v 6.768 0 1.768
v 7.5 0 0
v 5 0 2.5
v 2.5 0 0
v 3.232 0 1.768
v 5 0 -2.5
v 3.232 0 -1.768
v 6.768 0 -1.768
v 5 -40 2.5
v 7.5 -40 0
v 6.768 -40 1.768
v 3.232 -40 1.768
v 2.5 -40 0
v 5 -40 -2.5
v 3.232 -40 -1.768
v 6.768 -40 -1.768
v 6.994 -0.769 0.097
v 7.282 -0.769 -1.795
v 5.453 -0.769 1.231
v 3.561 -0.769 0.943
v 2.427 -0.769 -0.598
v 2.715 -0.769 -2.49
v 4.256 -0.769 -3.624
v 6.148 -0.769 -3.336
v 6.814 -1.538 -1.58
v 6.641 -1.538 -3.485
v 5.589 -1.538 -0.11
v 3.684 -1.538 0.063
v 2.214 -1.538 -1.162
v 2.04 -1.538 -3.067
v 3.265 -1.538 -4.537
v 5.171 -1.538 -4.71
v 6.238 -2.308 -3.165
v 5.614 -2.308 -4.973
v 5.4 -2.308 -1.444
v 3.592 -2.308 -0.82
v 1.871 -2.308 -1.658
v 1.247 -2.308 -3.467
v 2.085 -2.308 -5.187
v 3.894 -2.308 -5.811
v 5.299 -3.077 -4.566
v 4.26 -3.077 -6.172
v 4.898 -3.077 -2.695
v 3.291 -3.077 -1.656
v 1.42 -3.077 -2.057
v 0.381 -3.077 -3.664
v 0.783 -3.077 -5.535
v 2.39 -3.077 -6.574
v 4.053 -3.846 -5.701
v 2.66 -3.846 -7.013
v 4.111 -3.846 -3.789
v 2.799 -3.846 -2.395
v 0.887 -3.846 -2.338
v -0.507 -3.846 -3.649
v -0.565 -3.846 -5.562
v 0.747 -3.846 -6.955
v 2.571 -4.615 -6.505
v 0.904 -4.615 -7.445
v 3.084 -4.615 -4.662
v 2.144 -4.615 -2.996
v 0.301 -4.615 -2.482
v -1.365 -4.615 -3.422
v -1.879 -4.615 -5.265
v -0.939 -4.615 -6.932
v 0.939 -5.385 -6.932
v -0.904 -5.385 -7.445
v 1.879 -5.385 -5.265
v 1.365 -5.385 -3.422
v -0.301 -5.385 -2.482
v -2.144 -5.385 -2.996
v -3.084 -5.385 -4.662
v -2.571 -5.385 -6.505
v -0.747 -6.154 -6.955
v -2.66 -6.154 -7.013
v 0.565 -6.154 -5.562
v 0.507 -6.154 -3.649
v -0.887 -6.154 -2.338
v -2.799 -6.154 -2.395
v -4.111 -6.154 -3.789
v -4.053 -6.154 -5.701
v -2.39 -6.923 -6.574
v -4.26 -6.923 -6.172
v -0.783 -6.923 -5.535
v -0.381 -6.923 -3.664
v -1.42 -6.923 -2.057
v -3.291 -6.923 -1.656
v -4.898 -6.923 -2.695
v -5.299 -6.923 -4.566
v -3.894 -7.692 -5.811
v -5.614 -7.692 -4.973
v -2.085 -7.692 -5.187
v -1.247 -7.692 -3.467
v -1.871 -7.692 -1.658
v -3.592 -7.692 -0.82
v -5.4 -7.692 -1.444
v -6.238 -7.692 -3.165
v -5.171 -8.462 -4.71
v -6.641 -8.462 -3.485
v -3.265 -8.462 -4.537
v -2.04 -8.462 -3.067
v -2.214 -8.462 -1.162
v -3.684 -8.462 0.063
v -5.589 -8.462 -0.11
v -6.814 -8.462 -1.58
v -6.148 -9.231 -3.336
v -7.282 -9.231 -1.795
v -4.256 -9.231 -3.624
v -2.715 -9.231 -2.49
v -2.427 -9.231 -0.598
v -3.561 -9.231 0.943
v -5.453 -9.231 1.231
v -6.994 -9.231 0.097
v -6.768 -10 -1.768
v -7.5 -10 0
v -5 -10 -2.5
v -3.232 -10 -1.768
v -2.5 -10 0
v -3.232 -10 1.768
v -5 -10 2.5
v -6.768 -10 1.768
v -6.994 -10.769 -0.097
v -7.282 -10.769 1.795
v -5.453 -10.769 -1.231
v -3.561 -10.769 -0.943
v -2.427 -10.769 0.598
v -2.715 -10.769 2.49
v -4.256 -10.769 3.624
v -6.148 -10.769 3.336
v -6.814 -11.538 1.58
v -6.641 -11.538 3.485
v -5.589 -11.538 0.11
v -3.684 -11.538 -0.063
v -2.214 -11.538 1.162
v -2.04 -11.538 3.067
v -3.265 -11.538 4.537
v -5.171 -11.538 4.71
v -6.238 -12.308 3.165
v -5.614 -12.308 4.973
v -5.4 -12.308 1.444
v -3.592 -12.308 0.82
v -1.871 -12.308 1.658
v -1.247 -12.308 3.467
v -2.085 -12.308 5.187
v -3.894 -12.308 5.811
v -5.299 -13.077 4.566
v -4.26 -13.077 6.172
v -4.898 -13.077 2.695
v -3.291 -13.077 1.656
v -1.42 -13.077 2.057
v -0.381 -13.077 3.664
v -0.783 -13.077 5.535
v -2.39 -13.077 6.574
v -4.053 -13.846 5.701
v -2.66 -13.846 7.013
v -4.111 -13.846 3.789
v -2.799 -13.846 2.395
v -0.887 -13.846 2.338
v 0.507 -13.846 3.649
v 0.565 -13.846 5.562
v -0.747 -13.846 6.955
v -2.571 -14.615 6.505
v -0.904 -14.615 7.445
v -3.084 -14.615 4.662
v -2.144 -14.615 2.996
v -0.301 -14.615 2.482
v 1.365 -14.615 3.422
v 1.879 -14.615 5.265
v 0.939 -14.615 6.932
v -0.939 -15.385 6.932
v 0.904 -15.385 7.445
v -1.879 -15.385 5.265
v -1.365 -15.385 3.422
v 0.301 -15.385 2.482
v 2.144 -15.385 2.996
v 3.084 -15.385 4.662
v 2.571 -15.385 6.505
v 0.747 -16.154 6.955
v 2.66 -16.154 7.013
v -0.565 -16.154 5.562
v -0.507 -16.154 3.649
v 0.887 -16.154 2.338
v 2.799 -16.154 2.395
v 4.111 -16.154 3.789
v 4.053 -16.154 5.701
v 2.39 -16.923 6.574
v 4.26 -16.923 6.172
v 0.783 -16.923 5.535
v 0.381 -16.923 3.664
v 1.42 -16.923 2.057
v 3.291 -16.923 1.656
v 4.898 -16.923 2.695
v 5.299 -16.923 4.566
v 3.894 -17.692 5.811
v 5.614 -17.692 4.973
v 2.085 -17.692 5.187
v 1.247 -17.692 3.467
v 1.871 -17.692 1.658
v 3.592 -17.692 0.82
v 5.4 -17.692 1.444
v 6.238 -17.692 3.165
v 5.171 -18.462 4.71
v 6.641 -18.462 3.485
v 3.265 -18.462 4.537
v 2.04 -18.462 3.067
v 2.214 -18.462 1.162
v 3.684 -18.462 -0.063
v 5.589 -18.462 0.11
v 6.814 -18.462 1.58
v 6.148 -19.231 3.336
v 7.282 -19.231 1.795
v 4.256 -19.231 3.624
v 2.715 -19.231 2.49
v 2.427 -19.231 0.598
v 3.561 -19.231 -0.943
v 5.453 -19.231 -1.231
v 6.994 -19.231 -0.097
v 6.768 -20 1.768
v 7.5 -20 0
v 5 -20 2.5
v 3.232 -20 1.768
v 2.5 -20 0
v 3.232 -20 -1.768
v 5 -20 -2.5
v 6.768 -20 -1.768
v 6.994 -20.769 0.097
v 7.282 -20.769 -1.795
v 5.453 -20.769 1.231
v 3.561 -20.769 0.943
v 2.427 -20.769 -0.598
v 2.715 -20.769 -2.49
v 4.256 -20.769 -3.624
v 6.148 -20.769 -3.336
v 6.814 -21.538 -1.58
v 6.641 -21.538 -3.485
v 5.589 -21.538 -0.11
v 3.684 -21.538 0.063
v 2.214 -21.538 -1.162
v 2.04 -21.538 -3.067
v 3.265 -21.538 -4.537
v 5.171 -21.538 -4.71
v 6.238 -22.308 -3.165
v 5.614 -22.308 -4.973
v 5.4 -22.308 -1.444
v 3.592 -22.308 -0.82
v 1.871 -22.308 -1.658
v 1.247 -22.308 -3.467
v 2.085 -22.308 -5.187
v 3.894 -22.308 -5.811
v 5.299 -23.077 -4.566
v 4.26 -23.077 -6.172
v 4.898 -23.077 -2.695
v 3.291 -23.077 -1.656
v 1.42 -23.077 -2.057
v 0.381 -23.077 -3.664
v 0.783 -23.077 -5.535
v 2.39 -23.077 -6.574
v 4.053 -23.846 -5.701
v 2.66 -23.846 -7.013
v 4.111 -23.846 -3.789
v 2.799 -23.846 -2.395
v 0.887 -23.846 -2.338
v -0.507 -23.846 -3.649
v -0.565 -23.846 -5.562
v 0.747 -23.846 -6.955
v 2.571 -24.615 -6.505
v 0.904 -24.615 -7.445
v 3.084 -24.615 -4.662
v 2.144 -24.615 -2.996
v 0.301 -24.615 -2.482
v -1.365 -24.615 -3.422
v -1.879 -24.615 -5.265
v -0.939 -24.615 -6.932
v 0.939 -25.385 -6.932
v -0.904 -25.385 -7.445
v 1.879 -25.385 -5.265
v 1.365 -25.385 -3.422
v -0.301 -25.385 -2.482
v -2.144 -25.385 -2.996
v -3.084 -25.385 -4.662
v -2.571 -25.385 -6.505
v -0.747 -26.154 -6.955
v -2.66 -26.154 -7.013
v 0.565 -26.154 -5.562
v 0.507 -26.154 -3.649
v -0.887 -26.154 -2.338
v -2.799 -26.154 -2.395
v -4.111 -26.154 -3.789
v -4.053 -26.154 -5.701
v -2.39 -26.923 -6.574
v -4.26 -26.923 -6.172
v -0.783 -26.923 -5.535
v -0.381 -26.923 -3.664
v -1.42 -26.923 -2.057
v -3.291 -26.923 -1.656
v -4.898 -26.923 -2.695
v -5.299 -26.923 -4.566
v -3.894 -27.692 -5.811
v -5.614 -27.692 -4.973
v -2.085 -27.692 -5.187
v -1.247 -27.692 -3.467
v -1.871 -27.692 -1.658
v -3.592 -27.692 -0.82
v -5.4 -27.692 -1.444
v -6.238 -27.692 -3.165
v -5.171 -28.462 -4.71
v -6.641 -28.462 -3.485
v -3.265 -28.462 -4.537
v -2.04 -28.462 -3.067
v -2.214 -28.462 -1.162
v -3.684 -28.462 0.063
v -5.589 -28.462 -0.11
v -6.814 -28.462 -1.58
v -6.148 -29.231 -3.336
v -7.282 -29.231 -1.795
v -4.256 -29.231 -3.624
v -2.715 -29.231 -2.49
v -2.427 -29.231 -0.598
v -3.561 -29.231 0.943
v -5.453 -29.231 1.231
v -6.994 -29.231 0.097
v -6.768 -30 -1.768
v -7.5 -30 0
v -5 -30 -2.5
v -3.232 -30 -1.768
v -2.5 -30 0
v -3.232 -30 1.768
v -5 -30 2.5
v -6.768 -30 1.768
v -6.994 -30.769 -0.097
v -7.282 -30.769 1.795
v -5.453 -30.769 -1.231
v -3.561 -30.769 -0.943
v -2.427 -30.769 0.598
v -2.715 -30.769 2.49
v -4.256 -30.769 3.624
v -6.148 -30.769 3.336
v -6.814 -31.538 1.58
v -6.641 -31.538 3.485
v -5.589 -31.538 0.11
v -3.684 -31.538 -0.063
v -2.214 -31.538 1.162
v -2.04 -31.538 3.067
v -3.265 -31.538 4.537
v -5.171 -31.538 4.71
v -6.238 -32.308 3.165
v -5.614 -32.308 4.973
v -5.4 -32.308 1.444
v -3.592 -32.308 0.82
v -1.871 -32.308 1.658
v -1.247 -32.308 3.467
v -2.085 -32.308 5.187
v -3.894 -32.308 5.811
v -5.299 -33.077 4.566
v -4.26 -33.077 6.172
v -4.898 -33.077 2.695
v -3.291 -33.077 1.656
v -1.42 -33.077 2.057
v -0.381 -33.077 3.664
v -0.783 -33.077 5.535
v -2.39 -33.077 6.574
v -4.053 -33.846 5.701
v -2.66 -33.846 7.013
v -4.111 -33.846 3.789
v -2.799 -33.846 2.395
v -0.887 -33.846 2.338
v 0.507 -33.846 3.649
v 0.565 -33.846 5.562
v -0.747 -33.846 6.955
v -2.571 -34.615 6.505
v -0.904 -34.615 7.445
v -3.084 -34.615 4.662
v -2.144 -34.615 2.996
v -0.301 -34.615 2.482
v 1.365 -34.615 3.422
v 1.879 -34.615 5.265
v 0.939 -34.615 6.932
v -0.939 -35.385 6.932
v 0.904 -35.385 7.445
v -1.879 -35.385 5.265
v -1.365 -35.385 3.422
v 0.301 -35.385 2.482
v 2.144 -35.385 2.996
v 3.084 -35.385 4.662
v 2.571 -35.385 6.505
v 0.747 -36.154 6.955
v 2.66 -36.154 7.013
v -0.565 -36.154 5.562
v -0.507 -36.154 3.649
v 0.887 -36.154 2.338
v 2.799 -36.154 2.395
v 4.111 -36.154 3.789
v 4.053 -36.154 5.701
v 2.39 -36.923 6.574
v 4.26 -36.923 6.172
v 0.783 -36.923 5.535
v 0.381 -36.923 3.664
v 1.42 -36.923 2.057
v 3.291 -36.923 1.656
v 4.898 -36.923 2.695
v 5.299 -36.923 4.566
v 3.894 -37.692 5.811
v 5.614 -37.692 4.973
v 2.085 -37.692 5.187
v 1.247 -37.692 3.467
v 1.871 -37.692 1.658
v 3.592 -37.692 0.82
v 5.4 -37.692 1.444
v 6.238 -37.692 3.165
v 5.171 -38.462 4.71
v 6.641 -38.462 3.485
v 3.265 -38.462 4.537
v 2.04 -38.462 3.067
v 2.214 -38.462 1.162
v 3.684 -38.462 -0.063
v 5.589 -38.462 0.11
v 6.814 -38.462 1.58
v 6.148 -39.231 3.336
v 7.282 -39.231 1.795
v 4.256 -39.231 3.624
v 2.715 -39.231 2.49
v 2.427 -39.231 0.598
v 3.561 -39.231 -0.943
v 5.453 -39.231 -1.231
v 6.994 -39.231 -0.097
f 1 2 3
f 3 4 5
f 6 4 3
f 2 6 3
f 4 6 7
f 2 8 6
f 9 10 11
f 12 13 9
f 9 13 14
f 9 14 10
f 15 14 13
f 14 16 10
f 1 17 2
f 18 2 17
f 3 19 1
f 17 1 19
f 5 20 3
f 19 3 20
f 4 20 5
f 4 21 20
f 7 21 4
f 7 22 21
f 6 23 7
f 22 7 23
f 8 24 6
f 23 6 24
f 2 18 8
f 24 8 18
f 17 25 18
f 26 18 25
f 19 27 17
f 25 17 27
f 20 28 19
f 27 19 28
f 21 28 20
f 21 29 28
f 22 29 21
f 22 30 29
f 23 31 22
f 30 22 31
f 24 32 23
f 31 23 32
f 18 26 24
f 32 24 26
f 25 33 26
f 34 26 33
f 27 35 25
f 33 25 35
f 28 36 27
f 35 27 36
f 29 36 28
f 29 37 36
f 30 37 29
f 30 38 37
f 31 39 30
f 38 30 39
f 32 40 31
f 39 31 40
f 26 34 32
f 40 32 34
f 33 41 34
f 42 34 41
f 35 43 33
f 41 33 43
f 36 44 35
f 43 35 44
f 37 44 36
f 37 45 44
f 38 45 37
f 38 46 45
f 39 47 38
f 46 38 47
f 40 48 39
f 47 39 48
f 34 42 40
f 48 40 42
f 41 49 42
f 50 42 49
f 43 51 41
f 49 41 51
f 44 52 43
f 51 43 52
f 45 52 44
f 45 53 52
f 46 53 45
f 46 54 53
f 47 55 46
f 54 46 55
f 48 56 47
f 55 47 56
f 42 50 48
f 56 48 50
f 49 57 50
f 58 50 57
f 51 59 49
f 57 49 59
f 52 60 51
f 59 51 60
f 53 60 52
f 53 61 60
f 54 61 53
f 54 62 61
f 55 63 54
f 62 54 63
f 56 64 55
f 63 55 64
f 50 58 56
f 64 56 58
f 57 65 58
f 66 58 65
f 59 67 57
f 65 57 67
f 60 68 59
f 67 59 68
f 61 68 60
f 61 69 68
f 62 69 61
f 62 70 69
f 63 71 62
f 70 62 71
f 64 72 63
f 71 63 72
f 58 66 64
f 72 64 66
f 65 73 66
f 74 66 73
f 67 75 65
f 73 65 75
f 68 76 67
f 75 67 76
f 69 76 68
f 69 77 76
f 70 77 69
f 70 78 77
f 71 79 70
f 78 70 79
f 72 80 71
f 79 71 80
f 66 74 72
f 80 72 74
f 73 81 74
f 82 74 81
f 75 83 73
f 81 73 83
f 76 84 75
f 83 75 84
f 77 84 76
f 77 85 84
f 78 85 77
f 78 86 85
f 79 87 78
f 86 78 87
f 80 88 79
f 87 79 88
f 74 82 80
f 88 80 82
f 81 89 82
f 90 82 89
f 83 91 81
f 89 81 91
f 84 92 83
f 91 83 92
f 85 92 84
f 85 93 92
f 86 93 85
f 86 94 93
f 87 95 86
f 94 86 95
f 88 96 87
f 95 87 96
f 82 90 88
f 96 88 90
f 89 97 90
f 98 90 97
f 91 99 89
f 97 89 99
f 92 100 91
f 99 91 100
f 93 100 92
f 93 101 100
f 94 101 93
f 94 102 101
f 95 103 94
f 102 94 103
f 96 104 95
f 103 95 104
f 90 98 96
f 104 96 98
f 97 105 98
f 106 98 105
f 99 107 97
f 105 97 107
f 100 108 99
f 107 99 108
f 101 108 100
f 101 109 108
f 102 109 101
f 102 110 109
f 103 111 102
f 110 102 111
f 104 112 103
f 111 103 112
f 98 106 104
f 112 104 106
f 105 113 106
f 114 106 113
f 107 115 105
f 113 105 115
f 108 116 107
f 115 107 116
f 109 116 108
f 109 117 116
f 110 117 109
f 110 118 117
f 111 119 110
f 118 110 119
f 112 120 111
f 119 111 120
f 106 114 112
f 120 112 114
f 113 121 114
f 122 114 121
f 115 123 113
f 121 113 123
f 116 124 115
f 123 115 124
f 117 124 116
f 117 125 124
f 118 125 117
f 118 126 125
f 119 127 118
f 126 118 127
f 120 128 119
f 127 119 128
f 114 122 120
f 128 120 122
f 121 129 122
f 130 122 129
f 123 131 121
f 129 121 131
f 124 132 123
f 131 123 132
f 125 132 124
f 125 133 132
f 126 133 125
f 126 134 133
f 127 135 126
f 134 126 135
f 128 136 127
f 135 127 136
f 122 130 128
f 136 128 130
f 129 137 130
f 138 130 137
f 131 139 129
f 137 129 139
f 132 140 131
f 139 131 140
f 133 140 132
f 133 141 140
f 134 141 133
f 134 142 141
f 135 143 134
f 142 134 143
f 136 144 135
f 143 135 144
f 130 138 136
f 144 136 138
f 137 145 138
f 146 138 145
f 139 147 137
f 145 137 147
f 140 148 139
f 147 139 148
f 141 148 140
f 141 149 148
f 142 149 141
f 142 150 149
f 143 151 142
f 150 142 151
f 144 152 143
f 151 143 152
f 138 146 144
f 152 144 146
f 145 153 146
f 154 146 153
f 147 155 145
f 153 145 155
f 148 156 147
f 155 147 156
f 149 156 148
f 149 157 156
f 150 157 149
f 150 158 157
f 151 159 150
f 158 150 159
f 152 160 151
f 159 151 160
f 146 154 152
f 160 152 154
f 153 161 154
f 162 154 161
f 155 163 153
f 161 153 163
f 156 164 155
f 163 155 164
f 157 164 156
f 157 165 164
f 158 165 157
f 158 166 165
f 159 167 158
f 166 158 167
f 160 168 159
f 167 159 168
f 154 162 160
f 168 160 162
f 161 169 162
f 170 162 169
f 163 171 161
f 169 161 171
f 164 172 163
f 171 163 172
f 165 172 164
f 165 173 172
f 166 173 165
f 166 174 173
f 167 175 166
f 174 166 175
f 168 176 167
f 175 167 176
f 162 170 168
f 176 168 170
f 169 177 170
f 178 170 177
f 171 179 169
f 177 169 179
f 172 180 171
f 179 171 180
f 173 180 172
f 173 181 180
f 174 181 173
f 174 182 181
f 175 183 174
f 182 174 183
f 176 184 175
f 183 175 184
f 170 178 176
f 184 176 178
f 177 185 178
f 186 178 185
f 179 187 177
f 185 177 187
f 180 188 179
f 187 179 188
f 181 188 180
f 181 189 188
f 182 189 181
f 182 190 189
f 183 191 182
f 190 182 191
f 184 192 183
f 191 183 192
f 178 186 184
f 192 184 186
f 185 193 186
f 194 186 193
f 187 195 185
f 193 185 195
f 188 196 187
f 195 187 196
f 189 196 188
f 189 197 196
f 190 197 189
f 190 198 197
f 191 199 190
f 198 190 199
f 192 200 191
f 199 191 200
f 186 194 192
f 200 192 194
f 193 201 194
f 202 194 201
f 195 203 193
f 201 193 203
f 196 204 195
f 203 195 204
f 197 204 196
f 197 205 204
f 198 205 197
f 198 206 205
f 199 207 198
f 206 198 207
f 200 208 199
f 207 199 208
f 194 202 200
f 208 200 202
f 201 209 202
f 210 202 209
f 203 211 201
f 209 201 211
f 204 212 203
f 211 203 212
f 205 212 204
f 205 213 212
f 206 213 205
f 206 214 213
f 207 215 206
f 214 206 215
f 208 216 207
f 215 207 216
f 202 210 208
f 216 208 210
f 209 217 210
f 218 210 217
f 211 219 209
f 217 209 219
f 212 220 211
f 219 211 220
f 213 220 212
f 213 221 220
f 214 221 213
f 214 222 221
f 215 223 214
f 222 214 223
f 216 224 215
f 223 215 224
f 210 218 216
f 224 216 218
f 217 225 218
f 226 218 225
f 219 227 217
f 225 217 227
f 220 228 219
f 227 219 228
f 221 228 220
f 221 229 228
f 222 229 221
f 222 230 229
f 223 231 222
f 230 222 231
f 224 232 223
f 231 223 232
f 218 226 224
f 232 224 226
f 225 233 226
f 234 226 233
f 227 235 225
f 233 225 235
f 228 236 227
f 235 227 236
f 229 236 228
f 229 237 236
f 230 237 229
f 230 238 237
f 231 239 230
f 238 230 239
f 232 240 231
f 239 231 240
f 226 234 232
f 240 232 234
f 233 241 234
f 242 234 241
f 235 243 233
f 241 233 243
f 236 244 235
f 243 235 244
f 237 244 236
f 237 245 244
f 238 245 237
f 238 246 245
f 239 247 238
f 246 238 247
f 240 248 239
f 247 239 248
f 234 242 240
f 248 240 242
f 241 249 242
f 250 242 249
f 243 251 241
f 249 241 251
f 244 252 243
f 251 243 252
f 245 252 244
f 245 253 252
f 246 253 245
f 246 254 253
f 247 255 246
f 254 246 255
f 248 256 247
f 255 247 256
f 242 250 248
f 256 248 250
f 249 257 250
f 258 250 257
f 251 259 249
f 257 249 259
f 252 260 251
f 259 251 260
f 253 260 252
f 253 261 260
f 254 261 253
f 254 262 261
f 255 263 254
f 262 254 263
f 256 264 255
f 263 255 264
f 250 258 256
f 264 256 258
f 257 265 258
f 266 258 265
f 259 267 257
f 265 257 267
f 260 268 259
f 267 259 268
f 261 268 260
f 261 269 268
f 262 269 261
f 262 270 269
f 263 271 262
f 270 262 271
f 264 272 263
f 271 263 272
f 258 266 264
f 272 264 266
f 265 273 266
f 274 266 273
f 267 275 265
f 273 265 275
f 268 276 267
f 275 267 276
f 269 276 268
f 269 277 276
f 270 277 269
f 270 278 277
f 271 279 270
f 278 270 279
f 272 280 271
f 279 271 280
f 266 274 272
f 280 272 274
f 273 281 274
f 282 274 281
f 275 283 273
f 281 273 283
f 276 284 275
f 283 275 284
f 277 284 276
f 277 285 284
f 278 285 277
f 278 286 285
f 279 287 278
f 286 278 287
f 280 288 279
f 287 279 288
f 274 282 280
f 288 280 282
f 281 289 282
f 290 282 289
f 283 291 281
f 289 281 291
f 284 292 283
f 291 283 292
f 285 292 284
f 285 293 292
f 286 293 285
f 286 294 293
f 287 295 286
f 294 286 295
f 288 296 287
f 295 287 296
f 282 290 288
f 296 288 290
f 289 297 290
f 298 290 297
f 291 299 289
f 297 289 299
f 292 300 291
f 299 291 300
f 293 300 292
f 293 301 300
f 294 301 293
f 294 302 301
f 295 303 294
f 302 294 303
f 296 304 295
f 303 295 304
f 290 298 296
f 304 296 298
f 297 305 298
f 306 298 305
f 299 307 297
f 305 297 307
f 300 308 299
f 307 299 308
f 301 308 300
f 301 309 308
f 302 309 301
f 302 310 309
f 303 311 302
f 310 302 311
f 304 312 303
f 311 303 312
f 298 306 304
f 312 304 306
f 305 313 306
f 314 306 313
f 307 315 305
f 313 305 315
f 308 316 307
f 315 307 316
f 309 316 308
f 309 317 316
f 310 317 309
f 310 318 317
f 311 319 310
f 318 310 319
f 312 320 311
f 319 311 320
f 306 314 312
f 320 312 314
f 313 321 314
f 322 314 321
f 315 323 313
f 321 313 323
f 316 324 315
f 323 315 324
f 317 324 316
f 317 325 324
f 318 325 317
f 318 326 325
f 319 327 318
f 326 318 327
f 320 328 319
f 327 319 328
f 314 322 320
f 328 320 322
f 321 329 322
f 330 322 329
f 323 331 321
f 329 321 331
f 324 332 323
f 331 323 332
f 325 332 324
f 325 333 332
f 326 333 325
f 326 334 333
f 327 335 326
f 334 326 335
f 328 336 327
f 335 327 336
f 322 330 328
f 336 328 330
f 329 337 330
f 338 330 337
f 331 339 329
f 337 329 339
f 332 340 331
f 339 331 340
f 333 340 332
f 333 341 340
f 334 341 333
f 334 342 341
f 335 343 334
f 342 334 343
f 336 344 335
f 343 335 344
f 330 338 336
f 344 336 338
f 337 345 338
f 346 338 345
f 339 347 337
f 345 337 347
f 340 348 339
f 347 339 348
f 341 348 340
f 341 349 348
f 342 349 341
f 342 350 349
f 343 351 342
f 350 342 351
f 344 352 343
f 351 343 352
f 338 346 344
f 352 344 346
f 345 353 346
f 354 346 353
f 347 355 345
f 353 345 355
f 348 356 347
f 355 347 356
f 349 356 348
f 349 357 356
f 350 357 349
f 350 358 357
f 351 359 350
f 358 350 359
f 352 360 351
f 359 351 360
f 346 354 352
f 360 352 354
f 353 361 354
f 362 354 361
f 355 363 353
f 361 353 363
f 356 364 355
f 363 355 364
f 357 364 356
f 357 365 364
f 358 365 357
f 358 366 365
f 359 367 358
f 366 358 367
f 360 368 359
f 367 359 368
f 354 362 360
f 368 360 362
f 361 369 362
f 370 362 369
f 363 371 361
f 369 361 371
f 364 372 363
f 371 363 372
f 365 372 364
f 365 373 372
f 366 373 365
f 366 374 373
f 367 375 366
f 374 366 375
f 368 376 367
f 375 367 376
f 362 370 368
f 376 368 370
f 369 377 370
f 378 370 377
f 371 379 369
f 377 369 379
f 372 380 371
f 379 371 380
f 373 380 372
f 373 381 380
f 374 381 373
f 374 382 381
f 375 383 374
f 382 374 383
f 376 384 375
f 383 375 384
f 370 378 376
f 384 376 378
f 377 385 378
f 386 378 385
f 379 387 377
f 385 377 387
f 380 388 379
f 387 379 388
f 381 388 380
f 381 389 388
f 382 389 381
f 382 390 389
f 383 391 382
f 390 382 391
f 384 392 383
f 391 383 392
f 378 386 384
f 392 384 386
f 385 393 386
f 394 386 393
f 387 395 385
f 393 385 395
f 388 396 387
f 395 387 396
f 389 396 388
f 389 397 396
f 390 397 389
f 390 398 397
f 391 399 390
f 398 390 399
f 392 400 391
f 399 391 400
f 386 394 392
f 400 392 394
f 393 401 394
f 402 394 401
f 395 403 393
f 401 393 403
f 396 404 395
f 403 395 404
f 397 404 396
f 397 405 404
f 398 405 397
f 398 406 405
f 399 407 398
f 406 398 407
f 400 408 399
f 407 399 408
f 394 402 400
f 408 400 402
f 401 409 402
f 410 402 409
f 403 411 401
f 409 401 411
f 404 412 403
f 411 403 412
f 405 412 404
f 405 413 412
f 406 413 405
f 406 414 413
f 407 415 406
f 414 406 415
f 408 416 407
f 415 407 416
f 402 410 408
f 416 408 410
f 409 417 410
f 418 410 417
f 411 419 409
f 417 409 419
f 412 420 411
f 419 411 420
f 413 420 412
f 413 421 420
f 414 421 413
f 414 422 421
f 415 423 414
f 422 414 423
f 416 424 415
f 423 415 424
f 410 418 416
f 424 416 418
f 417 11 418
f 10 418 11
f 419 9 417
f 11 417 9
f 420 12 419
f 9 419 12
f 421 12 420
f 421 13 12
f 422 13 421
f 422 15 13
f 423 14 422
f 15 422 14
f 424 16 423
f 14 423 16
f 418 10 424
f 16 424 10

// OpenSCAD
rotate([90,0,0])
linear_extrude(height=40,twist=720)
translate([5,0,0])
circle(r=2.5);
